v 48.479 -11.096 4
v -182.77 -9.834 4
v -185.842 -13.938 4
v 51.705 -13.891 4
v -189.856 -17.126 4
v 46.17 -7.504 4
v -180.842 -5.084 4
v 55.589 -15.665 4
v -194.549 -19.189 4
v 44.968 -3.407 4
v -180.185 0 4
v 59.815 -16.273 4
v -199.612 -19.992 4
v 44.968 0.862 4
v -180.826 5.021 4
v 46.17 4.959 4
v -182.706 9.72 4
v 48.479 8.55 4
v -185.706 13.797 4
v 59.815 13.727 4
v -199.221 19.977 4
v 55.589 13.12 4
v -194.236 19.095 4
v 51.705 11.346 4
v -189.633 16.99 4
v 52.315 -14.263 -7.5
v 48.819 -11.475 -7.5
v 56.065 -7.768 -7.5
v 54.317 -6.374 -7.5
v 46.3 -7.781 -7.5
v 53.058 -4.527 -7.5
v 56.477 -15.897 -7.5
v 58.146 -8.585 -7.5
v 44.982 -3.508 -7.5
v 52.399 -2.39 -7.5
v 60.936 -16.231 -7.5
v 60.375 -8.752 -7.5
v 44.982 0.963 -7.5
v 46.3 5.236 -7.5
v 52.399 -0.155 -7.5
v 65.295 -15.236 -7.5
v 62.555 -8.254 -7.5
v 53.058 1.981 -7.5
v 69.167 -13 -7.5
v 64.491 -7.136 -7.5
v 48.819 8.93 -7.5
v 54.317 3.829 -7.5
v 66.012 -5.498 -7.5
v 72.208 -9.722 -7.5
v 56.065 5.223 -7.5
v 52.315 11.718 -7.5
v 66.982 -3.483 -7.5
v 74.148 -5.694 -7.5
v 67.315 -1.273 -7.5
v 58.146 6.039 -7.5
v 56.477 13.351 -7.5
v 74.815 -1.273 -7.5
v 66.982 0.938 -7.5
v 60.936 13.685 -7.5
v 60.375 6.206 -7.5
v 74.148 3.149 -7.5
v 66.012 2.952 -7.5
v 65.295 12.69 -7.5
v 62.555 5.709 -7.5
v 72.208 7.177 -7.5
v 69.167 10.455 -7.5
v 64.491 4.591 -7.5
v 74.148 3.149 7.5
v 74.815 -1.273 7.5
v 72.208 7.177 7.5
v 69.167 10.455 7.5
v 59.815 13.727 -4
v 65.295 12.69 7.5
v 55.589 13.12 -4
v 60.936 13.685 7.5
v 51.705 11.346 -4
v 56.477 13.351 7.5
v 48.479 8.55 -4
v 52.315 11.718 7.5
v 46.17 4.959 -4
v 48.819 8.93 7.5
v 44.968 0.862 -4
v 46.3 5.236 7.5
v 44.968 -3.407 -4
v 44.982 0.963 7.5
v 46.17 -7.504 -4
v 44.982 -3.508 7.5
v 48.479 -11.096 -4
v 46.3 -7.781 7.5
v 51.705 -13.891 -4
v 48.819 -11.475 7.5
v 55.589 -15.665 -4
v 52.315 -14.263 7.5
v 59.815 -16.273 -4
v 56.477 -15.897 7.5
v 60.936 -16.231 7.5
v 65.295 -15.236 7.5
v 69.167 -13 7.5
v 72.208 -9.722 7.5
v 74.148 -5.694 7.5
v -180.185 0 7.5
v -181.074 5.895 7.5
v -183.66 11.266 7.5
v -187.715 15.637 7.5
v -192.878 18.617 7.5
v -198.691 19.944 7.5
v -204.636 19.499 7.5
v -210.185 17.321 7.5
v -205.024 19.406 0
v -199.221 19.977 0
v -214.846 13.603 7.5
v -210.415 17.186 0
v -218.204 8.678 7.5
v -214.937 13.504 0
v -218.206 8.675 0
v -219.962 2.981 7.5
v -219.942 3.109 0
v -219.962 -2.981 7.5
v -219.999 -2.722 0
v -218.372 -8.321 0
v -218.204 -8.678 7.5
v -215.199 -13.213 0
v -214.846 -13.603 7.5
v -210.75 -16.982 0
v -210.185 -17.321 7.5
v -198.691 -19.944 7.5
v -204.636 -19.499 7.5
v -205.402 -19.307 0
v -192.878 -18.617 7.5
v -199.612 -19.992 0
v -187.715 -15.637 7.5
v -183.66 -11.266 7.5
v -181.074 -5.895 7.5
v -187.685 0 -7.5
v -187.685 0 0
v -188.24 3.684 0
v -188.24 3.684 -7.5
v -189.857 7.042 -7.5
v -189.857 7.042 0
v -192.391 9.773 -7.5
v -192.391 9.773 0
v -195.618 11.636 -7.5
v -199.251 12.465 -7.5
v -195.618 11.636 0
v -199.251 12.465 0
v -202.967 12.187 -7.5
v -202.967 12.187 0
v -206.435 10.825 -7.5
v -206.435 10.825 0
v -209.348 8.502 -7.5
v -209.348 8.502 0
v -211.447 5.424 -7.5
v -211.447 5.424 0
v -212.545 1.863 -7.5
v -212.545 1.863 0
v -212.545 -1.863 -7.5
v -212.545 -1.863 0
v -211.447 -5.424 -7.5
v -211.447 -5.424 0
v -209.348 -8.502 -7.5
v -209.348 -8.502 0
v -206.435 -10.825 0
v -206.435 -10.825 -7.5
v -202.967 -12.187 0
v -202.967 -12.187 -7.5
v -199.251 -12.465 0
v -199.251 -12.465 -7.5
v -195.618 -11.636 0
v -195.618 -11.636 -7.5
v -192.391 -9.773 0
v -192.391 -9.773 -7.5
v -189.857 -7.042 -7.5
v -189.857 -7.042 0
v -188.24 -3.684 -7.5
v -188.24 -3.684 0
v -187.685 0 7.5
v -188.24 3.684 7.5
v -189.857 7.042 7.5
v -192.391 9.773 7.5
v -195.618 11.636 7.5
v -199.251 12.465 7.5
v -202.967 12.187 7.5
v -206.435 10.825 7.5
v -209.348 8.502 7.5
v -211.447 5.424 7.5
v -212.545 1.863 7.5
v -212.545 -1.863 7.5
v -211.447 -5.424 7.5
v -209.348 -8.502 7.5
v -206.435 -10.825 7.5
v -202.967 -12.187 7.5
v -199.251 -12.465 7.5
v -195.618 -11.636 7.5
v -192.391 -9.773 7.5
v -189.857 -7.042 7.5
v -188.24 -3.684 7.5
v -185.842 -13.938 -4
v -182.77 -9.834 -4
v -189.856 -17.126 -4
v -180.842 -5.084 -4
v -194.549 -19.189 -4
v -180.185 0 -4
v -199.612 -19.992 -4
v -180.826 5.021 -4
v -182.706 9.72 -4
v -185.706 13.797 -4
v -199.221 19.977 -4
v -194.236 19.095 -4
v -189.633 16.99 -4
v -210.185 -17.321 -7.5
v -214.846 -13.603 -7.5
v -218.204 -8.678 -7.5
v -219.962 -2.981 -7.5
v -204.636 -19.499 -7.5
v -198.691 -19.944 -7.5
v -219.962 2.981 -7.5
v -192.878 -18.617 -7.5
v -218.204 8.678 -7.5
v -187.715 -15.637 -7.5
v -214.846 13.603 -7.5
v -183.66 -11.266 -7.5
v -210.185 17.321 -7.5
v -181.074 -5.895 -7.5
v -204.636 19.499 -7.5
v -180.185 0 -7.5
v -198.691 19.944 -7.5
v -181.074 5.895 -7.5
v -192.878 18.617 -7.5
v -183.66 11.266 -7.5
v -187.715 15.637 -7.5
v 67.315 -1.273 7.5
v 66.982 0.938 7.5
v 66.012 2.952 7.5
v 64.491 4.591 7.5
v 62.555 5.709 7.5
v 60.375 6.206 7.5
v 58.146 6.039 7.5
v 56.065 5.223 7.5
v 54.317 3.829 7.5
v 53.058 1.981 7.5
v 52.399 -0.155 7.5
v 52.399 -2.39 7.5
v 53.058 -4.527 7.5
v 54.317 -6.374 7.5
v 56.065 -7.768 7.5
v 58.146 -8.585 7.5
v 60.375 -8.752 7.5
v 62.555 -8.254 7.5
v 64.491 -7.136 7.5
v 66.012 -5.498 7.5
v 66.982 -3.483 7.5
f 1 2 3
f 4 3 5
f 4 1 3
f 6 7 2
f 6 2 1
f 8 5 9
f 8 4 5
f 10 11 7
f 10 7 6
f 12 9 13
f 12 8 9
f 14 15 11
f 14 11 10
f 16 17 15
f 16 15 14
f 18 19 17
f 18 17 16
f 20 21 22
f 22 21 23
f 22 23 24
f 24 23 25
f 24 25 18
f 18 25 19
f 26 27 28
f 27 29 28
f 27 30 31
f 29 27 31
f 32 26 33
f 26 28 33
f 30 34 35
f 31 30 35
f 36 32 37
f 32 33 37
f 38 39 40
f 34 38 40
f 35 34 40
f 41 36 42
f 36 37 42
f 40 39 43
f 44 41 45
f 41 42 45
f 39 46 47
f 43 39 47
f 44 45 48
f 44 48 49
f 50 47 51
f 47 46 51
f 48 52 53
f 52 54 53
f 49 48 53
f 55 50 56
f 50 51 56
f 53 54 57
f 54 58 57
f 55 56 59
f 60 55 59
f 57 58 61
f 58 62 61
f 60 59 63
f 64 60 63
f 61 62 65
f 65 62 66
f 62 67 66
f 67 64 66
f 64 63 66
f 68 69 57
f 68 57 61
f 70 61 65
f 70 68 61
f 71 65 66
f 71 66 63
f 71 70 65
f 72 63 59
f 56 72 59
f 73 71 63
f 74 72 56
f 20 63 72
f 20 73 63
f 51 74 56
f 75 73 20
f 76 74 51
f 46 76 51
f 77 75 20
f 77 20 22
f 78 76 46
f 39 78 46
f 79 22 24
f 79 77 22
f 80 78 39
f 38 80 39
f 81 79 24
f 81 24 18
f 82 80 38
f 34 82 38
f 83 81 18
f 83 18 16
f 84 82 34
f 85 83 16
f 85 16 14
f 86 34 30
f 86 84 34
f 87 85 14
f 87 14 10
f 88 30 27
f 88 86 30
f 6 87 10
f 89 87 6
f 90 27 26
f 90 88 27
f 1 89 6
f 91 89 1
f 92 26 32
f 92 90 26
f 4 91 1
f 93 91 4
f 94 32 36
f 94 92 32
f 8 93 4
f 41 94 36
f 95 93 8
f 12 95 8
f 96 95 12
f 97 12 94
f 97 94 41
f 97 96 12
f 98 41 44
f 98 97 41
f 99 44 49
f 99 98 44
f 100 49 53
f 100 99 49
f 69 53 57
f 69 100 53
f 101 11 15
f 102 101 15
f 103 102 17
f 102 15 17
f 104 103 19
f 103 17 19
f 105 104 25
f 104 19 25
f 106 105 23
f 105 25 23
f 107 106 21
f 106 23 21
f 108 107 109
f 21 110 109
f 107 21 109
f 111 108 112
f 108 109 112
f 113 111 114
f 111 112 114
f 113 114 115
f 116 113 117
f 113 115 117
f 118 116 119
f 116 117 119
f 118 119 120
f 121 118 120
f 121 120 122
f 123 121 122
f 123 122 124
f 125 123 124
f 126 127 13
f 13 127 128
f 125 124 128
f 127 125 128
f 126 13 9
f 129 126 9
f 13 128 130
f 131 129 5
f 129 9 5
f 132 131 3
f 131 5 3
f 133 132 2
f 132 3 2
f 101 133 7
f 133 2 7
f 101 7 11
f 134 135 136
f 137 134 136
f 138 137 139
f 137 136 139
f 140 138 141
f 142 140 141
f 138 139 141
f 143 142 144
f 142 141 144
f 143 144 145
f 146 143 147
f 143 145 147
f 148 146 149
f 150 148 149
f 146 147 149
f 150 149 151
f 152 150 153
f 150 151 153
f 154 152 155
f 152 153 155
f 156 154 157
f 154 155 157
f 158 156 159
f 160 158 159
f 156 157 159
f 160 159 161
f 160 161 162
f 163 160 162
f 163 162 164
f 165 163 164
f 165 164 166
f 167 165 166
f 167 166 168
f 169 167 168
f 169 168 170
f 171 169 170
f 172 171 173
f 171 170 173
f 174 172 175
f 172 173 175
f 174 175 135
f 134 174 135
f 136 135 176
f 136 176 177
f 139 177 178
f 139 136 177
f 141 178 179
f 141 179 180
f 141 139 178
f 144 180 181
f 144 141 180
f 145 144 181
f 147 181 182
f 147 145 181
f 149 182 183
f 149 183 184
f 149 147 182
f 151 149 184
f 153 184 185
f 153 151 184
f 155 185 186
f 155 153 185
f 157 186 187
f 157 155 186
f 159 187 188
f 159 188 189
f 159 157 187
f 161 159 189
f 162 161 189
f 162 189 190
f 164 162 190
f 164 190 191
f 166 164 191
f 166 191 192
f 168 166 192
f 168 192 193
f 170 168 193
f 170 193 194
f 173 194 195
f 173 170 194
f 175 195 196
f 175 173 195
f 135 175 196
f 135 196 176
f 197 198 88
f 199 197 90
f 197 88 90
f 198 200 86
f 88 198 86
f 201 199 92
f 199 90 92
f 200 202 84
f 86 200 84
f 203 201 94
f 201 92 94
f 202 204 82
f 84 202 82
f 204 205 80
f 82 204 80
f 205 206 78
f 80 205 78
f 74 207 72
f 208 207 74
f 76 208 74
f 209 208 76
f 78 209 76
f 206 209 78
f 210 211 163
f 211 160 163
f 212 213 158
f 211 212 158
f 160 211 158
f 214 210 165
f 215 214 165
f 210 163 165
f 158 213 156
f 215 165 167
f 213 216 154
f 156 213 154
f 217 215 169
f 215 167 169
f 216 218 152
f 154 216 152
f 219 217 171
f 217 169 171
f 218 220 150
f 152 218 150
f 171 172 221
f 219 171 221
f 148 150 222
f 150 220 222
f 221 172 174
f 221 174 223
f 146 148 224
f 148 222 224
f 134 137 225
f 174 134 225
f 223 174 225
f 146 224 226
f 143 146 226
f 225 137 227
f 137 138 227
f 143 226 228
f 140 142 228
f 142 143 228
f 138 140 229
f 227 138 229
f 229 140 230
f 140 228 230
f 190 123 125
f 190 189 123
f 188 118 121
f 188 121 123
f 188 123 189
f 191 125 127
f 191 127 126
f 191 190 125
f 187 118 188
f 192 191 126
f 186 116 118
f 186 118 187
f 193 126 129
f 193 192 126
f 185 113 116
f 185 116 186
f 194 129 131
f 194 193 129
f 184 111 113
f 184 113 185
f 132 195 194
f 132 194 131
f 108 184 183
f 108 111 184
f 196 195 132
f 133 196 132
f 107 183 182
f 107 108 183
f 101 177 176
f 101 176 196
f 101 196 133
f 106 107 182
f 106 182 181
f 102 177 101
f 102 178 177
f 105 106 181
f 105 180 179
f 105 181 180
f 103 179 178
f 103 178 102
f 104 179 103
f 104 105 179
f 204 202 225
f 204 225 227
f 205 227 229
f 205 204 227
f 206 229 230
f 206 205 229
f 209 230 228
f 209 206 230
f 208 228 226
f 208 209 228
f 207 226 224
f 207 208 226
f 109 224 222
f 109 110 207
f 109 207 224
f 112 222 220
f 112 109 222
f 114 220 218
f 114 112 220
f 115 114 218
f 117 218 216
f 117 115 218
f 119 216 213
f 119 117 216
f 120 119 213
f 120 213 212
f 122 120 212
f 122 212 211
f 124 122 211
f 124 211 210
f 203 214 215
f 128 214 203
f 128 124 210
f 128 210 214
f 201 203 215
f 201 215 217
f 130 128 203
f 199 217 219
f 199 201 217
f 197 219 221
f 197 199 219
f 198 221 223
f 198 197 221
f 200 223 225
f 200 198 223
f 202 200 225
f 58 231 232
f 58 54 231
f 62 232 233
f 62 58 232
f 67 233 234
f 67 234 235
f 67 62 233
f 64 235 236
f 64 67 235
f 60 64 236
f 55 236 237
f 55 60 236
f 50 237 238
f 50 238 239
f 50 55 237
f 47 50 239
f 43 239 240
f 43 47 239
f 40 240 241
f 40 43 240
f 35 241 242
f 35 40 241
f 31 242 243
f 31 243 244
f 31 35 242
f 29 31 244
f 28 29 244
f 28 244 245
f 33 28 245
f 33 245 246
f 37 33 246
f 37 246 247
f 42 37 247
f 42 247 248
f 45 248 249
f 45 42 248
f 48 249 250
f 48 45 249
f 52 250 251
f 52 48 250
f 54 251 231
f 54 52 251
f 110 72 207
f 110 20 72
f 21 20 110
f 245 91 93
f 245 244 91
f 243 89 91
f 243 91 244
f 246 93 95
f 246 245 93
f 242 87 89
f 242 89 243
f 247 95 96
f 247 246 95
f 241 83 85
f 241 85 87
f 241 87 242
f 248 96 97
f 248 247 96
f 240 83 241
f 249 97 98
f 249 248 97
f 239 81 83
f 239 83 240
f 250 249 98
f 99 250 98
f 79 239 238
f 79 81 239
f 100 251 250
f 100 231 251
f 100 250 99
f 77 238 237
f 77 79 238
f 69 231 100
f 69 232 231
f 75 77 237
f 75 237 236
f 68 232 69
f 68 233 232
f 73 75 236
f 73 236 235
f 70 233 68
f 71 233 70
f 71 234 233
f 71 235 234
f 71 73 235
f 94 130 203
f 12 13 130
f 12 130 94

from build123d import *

# Parameters (mm, degrees)
BOSS_EXTRUDE1_DEPTH = 4
SKETCH2_R           = 20
SKETCH2_R_2         = 12.5
SKETCH2_R_3         = 15
SKETCH2_R_4         = 7.5
BOSS_EXTRUDE2_DEPTH = 7.5


with BuildPart() as part:
    # Sketch1 → Boss-Extrude1 (new, symmetric)
    with BuildSketch(Plane.XY):
        with BuildLine():
            Line((59.81488788, 13.727342811), (-199.220649297, 19.976731751))
            ThreePointArc((-199.220649297, 19.976731751), (-185.706002057, 13.796933419), (-180.18511212, 0))
            ThreePointArc((-180.18511212, 0), (-185.84170962, -13.937962718), (-199.611792592, -19.991780929))
            Line((-199.611792592, -19.991780929), (59.81488788, -16.272657189))
            ThreePointArc((59.81488788, -16.272657189), (44.81488788, -1.272657189), (59.81488788, 13.727342811))
        make_face()
    extrude(amount=BOSS_EXTRUDE1_DEPTH, both=True)

    # Sketch2 → Boss-Extrude2 (add, symmetric)
    # profile 1 of 2: a face of its own
    with BuildSketch(Plane.XY):
        with Locations((-200.18511212, 0)):
            Circle(SKETCH2_R)
        with Locations((-200.18511212, 0)):
            Circle(SKETCH2_R_2, mode=Mode.SUBTRACT)
    # profile 2 of 2: a face of its own
    with BuildSketch(Plane.XY):
        with Locations((59.81488788, -1.272657189)):
            Circle(SKETCH2_R_3)
        with Locations((59.81488788, -1.272657189)):
            Circle(SKETCH2_R_4, mode=Mode.SUBTRACT)
    extrude(amount=BOSS_EXTRUDE2_DEPTH, both=True)


solid = part.part
